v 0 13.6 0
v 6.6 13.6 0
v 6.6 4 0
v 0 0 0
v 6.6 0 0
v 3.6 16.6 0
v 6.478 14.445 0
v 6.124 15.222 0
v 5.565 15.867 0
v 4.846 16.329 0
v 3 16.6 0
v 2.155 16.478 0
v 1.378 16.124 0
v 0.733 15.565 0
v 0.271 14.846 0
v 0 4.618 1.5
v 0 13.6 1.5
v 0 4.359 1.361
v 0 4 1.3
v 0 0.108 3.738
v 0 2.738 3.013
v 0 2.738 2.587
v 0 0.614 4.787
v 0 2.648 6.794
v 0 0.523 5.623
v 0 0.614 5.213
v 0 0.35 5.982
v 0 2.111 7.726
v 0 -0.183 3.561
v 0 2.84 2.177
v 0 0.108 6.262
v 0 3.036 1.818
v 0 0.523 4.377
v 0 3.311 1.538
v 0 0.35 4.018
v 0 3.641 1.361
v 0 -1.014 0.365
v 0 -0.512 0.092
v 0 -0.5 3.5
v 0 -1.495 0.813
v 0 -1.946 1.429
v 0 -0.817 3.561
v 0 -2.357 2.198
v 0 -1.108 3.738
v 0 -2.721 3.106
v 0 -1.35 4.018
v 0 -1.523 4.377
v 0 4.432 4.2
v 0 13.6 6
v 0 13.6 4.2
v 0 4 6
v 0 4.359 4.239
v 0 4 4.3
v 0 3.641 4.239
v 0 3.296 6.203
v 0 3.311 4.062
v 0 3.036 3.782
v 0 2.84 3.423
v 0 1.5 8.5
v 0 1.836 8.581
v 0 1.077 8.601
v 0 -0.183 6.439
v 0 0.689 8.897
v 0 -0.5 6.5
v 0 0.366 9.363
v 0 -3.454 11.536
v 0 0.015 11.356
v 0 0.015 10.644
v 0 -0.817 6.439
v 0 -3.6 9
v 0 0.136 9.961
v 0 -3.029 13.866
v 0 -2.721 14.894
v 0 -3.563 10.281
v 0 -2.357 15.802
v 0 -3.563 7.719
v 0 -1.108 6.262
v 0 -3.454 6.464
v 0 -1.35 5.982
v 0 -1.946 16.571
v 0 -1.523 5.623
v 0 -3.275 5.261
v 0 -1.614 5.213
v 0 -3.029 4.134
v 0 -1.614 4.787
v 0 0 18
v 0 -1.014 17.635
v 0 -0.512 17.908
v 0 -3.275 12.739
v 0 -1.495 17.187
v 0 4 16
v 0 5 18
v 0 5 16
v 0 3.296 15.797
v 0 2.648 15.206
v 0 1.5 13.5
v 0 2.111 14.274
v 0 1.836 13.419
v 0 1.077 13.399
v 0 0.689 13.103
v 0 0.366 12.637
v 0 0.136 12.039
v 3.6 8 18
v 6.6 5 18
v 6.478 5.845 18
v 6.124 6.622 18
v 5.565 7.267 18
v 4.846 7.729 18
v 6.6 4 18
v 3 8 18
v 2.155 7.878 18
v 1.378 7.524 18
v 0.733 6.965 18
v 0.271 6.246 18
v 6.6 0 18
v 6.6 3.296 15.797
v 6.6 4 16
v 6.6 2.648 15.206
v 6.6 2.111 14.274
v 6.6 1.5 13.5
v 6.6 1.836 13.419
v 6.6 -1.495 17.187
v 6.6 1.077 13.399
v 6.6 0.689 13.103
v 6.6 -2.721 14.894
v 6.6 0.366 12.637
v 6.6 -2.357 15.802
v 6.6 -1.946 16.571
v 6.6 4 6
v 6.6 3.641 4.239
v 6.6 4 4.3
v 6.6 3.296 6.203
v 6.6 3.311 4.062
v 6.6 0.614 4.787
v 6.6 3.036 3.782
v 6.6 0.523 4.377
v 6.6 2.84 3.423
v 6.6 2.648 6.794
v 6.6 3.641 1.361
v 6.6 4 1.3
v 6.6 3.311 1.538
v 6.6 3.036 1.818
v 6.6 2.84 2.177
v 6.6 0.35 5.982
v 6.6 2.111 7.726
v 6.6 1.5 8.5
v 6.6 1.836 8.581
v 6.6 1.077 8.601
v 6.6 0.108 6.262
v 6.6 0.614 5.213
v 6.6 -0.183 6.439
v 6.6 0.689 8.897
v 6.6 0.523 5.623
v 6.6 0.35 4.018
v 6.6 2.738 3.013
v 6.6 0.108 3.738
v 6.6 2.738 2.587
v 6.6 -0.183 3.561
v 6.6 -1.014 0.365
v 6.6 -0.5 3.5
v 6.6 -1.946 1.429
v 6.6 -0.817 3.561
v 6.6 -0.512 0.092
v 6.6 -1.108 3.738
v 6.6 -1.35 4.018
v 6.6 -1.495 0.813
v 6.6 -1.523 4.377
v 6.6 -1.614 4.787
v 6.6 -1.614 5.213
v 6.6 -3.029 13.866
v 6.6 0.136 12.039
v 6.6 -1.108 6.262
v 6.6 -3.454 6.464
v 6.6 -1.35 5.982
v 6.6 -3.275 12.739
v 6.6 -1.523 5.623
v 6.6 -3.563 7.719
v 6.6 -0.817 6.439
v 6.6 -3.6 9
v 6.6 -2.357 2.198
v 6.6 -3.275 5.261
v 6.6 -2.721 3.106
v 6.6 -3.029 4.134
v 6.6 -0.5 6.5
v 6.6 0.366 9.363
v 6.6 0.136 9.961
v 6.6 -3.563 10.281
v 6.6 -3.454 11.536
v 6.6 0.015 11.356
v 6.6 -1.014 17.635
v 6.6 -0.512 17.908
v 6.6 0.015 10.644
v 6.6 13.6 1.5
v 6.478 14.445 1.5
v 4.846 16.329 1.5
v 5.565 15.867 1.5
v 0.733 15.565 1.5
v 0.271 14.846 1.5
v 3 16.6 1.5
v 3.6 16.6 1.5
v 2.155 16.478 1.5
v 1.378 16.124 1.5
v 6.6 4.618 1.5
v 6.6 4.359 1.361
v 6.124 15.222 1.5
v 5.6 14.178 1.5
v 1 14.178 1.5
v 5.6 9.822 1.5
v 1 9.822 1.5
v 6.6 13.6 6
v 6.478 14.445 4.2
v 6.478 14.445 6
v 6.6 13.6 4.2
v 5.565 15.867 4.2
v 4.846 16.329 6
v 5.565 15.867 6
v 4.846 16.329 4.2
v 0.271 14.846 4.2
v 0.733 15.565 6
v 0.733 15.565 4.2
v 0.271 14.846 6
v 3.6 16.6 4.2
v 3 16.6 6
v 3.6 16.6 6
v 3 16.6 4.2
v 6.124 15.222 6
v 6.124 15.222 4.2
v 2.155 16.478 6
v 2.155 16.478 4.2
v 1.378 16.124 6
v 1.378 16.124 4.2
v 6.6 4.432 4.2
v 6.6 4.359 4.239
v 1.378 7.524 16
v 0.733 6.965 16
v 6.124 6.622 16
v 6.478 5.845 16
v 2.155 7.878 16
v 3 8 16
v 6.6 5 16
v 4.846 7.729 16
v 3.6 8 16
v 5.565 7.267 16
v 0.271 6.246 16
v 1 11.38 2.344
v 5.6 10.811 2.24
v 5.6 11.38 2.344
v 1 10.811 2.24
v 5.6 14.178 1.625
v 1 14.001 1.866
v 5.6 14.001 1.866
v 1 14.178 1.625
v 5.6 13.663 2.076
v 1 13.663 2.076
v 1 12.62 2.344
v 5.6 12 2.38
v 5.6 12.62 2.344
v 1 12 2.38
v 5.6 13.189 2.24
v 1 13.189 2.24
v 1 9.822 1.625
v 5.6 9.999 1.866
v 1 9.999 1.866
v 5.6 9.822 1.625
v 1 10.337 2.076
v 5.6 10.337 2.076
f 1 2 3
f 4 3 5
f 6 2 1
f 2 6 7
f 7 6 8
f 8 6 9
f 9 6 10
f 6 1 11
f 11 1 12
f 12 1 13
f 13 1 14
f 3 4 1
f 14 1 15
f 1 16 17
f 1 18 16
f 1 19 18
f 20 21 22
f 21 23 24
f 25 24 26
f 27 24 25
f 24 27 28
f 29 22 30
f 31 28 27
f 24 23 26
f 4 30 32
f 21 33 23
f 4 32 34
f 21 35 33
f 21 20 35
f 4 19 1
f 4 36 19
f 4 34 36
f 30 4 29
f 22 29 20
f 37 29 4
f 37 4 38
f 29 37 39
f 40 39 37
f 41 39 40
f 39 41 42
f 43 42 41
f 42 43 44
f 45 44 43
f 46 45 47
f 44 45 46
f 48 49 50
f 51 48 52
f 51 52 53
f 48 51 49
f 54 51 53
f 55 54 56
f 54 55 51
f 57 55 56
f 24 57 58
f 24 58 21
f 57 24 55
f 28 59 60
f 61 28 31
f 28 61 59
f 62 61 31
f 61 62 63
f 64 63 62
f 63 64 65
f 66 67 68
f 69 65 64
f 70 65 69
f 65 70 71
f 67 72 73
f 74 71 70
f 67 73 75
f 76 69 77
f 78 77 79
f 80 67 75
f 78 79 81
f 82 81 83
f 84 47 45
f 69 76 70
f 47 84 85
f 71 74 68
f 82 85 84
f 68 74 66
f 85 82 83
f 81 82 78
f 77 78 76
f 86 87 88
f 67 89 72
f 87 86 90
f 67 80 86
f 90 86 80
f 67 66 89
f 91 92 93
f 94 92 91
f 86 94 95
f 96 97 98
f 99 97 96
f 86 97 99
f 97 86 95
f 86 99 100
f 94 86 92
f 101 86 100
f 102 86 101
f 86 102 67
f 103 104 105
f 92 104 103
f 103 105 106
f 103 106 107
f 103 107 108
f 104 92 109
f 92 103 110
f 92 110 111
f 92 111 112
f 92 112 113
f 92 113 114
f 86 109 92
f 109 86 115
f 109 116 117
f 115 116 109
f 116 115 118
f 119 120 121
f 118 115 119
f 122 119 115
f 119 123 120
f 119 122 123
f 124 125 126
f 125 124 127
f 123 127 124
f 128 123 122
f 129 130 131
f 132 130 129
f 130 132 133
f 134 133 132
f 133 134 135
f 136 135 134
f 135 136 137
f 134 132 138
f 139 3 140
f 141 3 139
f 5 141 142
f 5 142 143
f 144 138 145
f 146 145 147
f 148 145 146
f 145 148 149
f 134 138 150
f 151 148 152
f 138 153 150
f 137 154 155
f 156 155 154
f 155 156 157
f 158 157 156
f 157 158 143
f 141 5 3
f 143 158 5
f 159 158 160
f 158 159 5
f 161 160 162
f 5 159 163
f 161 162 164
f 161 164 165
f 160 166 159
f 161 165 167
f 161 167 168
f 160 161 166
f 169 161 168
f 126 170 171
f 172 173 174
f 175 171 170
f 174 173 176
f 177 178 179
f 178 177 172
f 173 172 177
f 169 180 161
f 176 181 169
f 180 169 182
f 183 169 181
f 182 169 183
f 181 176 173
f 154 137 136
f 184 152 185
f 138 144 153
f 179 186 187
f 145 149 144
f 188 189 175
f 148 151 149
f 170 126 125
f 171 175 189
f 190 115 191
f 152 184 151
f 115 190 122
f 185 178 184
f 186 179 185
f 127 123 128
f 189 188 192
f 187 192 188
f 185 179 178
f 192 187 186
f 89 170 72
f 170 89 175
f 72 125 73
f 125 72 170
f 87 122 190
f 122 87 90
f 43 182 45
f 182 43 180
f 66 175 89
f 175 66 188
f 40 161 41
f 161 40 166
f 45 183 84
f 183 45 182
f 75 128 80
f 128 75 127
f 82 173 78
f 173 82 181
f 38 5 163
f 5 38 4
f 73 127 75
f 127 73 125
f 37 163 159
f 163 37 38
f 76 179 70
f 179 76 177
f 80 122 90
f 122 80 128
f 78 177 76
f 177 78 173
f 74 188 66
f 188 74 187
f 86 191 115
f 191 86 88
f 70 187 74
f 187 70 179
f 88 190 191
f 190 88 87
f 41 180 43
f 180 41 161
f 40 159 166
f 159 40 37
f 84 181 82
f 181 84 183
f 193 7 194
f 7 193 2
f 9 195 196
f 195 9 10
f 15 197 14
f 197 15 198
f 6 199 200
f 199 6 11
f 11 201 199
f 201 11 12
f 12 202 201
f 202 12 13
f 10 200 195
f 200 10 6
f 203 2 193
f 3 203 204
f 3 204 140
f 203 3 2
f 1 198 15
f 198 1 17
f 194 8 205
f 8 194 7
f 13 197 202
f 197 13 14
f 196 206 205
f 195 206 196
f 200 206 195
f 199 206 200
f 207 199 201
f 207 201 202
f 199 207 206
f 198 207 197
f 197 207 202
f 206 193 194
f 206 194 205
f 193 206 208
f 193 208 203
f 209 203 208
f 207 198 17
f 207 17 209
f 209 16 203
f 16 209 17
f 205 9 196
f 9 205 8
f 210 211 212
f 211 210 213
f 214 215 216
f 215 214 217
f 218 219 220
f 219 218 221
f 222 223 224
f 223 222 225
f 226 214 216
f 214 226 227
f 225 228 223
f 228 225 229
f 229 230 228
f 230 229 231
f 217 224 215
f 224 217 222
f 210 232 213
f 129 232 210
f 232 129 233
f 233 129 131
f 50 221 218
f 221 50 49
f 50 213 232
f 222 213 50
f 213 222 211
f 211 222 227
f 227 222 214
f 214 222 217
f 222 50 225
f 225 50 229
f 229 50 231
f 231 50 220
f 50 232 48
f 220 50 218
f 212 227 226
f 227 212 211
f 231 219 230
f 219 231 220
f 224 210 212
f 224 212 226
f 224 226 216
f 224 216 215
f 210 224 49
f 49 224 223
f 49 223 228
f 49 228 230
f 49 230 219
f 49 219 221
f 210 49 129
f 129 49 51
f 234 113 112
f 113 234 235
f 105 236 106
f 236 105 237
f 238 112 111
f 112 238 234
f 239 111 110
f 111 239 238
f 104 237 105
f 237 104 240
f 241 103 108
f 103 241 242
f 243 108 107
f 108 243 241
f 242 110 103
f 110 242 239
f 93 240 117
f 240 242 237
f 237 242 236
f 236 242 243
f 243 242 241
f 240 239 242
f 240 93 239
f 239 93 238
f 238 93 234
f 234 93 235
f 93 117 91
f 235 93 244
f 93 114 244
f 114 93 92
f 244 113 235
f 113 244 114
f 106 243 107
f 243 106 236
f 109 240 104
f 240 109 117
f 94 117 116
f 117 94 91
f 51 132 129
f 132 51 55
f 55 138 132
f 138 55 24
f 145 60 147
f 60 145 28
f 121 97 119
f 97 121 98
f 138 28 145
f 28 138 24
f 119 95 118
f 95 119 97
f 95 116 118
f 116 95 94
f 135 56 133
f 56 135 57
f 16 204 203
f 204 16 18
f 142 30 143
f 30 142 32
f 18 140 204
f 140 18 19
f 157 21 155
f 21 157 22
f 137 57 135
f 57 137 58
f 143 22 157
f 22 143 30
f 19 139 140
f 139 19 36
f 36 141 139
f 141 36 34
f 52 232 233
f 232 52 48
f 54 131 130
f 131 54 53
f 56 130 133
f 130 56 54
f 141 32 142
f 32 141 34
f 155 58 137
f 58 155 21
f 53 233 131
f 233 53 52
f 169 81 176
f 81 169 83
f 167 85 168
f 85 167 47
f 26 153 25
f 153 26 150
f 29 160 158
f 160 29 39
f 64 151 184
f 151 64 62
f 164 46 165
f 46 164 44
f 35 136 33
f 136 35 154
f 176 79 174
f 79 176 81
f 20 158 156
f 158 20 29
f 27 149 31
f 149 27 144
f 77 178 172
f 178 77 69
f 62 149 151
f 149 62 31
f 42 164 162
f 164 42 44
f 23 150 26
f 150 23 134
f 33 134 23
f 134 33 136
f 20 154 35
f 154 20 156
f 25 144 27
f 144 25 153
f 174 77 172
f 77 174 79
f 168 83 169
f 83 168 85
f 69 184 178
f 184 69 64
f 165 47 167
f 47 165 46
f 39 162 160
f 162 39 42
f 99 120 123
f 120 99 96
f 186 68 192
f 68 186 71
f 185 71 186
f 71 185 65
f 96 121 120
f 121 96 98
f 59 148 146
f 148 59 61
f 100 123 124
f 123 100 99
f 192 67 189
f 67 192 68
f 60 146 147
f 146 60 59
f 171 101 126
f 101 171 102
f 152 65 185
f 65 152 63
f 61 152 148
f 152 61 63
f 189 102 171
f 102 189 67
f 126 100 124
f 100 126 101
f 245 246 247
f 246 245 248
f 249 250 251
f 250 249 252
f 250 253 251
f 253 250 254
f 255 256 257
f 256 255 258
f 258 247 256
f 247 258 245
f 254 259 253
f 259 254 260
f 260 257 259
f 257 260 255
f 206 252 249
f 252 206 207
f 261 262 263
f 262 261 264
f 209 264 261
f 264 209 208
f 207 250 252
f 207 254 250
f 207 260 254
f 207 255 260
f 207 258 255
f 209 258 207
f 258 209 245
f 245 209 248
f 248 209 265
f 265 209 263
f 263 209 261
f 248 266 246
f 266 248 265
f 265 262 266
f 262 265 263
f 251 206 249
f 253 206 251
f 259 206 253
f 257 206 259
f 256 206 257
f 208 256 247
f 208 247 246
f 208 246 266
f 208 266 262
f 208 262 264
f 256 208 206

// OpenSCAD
// PhonePixel4a
// Holder for phone in the car
// updated 7 Feb 2021, Tom Flint
//-------------------------

Bhi = 150-5;          // base height
Bwide = 70.5;       // base width

module clip1(
    Chi = 18,
    Cwide=10,
    Cthick=2,
    Cdeep=15,
    Cround=3){

    linear_extrude(height=Chi)
    square([Cwide,1.5*Cthick]); 
    
/*    translate([0,0.75*Cthick,0])
    cylinder(r=0.75*Cthick,h=Chi,$fn=22);
        
    translate([Cwide,0.75*Cthick,0])
    cylinder(r=0.75*Cthick,h=Chi,$fn=22);
*/
    color("green")
    linear_extrude(height=Cthick)
    translate([Cround,Cround,0])
    offset(r=Cround,$fn=22)
    square([Cwide-2*Cround,Cdeep-2*Cround]);  

    color("red")
    translate([0,0,4])
    linear_extrude(height=Cthick)
    translate([Cround,Cround,0])
    offset(r=Cround,$fn=22)
    square([Cwide-2*Cround,Cdeep-2*Cround]);  
      
    color("cyan")
    translate([0,0,Chi-Cthick])
    linear_extrude(height=Cthick)
    translate([Cround,Cround,0])
    offset(r=Cround,$fn=22)
    square([Cwide-2*Cround,Cdeep-2*Cround-5]);  
}

//-------------------------
module clip2(
    Chi = 18,
    Cwide=7,
    Cthick=2,
    Cdeep=16.6,
    Cround=3,
    tol=0.0){

    difference(){   // diff1
    union(){
        linear_extrude(height=Chi+tol)
        square([Cwide-0.4+tol,2*Cthick+tol]); 
        
        color("orange")
        translate([-tol/2,0,9+tol/2])
        scale([1,0.4,1])
        rotate([0,90,0])
        cylinder(r=9+tol,h=Cwide-0.4+tol,$fn=44);
        
        color("green")
        translate([0,0,-tol/2])
        linear_extrude(height=Cthick-0.5+tol)
        translate([Cround,Cround+tol])
        offset(r=Cround+tol,$fn=22)
        square([Cwide-2*Cround-0.4,Cdeep-2*Cround]);  

        color("red")
        translate([0,0,4.2])
        translate([0,0,-tol/2])
        linear_extrude(height=Cthick-0.2+tol)
        translate([Cround,Cround+tol])
        offset(r=Cround+tol,$fn=22)
        square([Cwide-2*Cround-0.4,Cdeep-2*Cround]);  
          
        color("cyan")
        translate([0,0,Chi-Cthick])
        translate([0,0,-tol/2])
        linear_extrude(height=Cthick+tol)
        translate([Cround,Cround+tol])
        offset(r=Cround+tol,$fn=22)
//        square([Cwide-2*Cround-0.4,Cdeep-2*Cround-9]);  
        square([Cwide-2*Cround-0.4,8-2*Cround]);  
//        square([Cwide-2*Cround-0.4,Cdeep-2*Cround-4]);  
    }   // end of union

    color("pink")
    translate([-1,4,11])
    scale([1,0.5,1])
    rotate([0,90,0])
    cylinder(r=5,h=Cwide-0.4+2,$fn=22);
    
    color("cyan")
    translate([-1,4,2.8])
    scale([1,0.85,1])
    rotate([0,90,0])
    cylinder(r=1.5,h=Cwide-0.4+2,$fn=22);

    color("cyan")
    translate([-1,-0.5,5])
    scale([1,0.75,1])
    rotate([0,90,0])
    cylinder(r=1.5,h=Cwide-0.4+2,$fn=22);

    // cut for buttons, extra clearance for power and volume keys
    color("cyan")
    translate([-1,1.5,11])
    scale([1,0.6,1])
    rotate([0,90,0])
    cylinder(r=2.5,h=Cwide-0.4+2,$fn=22);
    
}   // end of diff1

// raised bump on base attachment
color("pink")
translate([1,Cdeep-4.6,1.5])
scale([1,1,0.4])
rotate([0,90,0])
cylinder(r=2.2,h=Cwide-0.4-2,$fn=22);

}

//--------------------------
// Base
module base1(
    Bround=7,
    Bthick=4
){

    translate([0,0,2]) 
    linear_extrude(height=Bthick)
    offset(r=Bround,$fn=44)
    square(size=[Bwide-2*Bround,Bhi-2*Bround],center=true);

}

//--------------------------
// Hinge
module hinge1(
){
    translate([2,0,0])
    difference(){
    
    linear_extrude(height=3)
    offset(r=2,$fn=22)
    translate([1,2,0])
    square([51-6,7-2]);
    
    linear_extrude(height=1.25)
    square([51,7]);
    }
    
    translate([25.5,2.5,-4])
    cylinder(r1=2.4,r2=2.6,h=7,$fn=22);
    translate([25.5-18.5,2.5,-4])
    cylinder(r1=2.4,r2=2.6,h=7,$fn=22);
    translate([25.5+18.5,2.5,-4])
    cylinder(r1=2.4,r2=2.6,h=7,$fn=22);
        
    
}

//--------------------------
// Hinge
module hinge2(){
$fn=99;
    
difference(){
    union(){
    translate([2,0,0])
    linear_extrude(height=2)
    offset(r=2)
    translate([0,2,0])
    square([44,5]);
        
    translate([25.5-2,4.5,-6])
    cylinder(r1=2.2,r2=2.6,h=8);
    translate([25.5-18.5-2,4.5,-6])
    cylinder(r1=2.2,r2=2.6,h=8);
    translate([25.5+18.5-2,4.5,-6])
    cylinder(r1=2.2,r2=2.6,h=8);
    }   // end union

/*    
    translate([25.5-2,4.5,-7])
    cylinder(r1=0.4,r2=0.8,h=10);
    translate([25.5-18.5-2,4.5,-7])
    cylinder(r1=0.4,r2=0.8,h=10);
    translate([25.5+18.5-2,4.5,-7])
    cylinder(r1=0.4,r2=0.8,h=10);
    */
    }   // end diff
}


//===========================

if(0){
    difference(){
        base1();

        // hole for the fingerprint sensor
        color("green")
        translate([0,31,0]) 
        cylinder(r1=14,r2=10,h=7);

        // cut for the hinge
        translate([25.5,49,2])
        rotate([0,180,0])
        hinge1();
        
        // cuts for clips
        translate([0,0,0.01])
        if(1){

            color("red")
            translate([-Bwide/2+6,-Bhi/2-2,0]) clip2(tol=0.15);

            color("pink")
            translate([Bwide/2-6-7,-Bhi/2-2,0]) clip2(tol=0.15);


            color("cyan")
            translate([Bwide/2+2,-Bhi/2+17,0]) 
            rotate([0,0,90])clip2(tol=0.15);

            color("cyan")
            translate([Bwide/2+2,Bhi/2-30,0]) 
            rotate([0,0,90])clip2(tol=0.15,Cdeep=16.6-5);

            color("orange")
            translate([-Bwide/2-2,-Bhi/2+17+6.5,0]) 
            rotate([0,0,-90])clip2(tol=0.15);

            color("orange")
            translate([-Bwide/2-2,Bhi/2-30+6.5,0]) 
            rotate([0,0,-90])clip2(tol=0.15,Cdeep=16.6-5);

        }    

        // cuts so text goes into the surface
        if(1){
            // extrude some text, provides air space on the backside, protects the camera bump
            translate ([0,5,6-0.3]) color("blue") linear_extrude(height=2){
            text("VINGILOT", font = "Open Sans:style=Bold", size=8,halign="center",valign="center",spacing=1.1);
            }

            translate ([0,-45,6-0.3]) color("blue") linear_extrude(height=2){
            text("* * * * *", font = "Open Sans:style=Bold", size=10,halign="center",valign="center",spacing=1.1);
            }

            translate ([-10,60,6-0.3]) color("blue") linear_extrude(height=2){
            text("* * *", font = "Open Sans:style=Bold", size=10,halign="center",valign="center",spacing=1.1);
            }

        }

    }
}

// Text as separate object and amf file
if(0){
    // extrude some text, provides air space on the backside, protects the camera bump
    translate ([0,5,6-0.3]) color("blue") linear_extrude(height=2){
    text("VINGILOT", font = "Open Sans:style=Bold", size=8,halign="center",valign="center",spacing=1.1);
    }

    translate ([0,-45,6-0.3]) color("blue") linear_extrude(height=2){
    text("* * * * *", font = "Open Sans:style=Bold", size=10,halign="center",valign="center",spacing=1.1);
    }

    translate ([-10,60,6-0.3]) color("blue") linear_extrude(height=2){
    text("* * *", font = "Open Sans:style=Bold", size=10,halign="center",valign="center",spacing=1.1);
    }

}


//difference(){
//clip2(tol=0.2);
//clip2(tol=0);
//}

// clips
if(0){

    color("red")
    translate([-Bwide/2+6,-Bhi/2-2,0]) clip2();

    color("pink")
    translate([Bwide/2-6-7,-Bhi/2-2,0]) clip2();


    color("cyan")
    translate([Bwide/2+2,-Bhi/2+16,0]) 
    rotate([0,0,90])clip2();

    color("cyan")
    translate([Bwide/2+2,Bhi/2-30,0]) 
    rotate([0,0,90])clip2(Cdeep=11.6);

    color("orange")
    translate([-Bwide/2-2,-Bhi/2+16+6,0]) 
    rotate([0,0,-90])clip2();

    color("orange")
    translate([-Bwide/2-2,Bhi/2-30+6,0]) 
    rotate([0,0,-90])clip2(Cdeep=11.6);

    translate([25.5,49,2])
    rotate([0,180,0])
    hinge1();

}    

// This is the long clip
clip2();

// This is the short clip
//~ clip2(Cdeep=11.6);

//hinge1();
//color("orange") clip1();

//hinge2();
//translate([15,0,0]) clip2();

//===========================
